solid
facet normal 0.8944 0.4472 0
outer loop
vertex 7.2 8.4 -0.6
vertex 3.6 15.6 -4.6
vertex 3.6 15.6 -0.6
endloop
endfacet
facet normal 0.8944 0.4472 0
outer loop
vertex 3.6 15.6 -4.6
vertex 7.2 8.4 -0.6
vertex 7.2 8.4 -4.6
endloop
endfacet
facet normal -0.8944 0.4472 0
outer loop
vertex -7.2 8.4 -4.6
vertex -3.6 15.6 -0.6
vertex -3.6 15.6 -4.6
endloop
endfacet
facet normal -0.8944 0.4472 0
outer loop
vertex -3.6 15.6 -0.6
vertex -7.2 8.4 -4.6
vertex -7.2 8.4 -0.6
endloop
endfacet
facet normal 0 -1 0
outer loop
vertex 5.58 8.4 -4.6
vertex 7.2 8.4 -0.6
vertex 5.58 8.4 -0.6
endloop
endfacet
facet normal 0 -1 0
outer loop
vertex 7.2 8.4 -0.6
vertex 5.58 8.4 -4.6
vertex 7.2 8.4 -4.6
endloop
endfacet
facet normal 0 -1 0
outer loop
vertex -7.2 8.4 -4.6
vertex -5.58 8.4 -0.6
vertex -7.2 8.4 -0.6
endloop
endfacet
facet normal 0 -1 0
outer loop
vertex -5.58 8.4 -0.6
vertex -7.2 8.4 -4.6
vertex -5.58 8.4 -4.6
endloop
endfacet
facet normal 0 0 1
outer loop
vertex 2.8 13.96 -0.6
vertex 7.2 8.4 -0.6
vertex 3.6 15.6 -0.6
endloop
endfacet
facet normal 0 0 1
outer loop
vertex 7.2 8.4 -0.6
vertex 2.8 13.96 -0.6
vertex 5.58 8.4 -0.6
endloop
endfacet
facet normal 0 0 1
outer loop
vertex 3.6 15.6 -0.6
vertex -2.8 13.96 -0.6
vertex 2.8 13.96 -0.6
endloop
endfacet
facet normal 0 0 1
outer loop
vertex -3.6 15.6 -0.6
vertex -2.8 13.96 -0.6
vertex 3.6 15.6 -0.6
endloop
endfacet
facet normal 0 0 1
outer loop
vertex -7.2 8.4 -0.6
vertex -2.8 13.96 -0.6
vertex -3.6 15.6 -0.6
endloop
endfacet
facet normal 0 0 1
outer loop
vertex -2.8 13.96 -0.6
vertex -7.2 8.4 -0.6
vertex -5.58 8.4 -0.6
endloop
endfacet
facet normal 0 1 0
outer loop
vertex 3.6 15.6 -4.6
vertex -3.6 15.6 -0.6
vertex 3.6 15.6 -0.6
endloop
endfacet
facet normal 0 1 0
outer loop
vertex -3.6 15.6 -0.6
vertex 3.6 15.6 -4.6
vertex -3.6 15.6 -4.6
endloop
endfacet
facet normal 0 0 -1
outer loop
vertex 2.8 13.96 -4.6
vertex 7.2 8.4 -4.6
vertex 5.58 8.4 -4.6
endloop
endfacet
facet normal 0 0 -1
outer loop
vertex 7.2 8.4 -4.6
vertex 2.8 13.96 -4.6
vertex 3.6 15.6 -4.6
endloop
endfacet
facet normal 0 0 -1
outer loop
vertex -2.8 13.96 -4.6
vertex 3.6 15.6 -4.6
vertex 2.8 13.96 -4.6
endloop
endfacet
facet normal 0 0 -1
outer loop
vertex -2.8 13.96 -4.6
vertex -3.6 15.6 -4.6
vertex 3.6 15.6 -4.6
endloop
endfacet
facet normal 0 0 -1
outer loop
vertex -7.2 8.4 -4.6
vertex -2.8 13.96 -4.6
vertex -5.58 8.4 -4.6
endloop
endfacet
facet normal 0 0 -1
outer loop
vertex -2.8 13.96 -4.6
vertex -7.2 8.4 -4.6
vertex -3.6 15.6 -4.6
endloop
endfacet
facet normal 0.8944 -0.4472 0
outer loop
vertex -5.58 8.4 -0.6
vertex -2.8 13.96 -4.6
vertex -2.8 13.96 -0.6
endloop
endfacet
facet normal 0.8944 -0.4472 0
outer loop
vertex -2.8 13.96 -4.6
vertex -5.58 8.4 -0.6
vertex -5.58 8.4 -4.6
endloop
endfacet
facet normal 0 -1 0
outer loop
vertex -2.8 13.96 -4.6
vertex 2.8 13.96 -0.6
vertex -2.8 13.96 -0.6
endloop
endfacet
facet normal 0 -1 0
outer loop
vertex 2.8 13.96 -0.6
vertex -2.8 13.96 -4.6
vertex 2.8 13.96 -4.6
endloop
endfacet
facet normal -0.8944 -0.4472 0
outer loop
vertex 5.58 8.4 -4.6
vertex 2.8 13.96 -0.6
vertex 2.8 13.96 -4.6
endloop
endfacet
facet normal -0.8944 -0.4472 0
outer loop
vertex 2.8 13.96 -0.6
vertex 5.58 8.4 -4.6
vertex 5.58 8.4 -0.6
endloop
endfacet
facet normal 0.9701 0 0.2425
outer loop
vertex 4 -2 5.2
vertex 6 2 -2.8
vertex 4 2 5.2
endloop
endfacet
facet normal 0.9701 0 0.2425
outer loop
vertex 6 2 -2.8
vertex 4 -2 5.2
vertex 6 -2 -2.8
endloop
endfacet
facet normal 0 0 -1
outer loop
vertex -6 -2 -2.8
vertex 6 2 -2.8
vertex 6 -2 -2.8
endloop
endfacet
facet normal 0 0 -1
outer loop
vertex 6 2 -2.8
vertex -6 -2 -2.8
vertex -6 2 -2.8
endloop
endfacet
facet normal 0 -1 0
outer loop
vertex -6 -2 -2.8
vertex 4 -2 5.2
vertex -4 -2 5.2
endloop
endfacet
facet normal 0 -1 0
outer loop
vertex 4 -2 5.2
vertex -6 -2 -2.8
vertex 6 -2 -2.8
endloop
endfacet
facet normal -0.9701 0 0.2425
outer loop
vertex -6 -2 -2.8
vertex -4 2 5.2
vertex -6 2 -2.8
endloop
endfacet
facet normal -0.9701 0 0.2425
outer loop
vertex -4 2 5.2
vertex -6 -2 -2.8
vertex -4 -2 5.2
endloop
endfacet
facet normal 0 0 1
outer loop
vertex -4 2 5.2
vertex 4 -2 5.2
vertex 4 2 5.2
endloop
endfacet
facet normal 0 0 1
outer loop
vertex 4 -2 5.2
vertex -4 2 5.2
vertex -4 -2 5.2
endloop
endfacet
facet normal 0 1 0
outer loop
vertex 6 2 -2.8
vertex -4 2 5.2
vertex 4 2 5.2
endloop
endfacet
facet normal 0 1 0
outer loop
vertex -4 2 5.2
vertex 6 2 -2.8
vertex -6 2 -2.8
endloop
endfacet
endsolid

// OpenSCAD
module pagoda(scale=1, height=1, ratio=2, center=true) {
	scale([scale,scale])
	linear_extrude(height=height, center=center)
	polygon(points=[[-1,1],[1,1],[1*ratio,-1],[-1*ratio,-1]], paths=[[0,1,2,3]]);
}

module female(thickness=0.3) {
	difference() {
		%cube([4,2+thickness,1+(2*thickness)], center=true);
		translate([0,thickness,0]) pagoda(ratio=1.5);
	}
}

module male() {
	difference() {
		pagoda(ratio=2, scale=0.9);		
		//translate([0,-0.7]) pagoda(ratio=2);
		translate([0,-0.21]) pagoda(ratio=2, scale=0.7, height=1.1);
	}
}

module connector(design=false) {
	scale(4) if(!design) {
		//Print
		translate([0,3,0-1.15+0.5]) male();
		rotate([90]) female();
	} else {
		//Design
		male();
		% female();
	}
}

//connector(design=true);
connector();
